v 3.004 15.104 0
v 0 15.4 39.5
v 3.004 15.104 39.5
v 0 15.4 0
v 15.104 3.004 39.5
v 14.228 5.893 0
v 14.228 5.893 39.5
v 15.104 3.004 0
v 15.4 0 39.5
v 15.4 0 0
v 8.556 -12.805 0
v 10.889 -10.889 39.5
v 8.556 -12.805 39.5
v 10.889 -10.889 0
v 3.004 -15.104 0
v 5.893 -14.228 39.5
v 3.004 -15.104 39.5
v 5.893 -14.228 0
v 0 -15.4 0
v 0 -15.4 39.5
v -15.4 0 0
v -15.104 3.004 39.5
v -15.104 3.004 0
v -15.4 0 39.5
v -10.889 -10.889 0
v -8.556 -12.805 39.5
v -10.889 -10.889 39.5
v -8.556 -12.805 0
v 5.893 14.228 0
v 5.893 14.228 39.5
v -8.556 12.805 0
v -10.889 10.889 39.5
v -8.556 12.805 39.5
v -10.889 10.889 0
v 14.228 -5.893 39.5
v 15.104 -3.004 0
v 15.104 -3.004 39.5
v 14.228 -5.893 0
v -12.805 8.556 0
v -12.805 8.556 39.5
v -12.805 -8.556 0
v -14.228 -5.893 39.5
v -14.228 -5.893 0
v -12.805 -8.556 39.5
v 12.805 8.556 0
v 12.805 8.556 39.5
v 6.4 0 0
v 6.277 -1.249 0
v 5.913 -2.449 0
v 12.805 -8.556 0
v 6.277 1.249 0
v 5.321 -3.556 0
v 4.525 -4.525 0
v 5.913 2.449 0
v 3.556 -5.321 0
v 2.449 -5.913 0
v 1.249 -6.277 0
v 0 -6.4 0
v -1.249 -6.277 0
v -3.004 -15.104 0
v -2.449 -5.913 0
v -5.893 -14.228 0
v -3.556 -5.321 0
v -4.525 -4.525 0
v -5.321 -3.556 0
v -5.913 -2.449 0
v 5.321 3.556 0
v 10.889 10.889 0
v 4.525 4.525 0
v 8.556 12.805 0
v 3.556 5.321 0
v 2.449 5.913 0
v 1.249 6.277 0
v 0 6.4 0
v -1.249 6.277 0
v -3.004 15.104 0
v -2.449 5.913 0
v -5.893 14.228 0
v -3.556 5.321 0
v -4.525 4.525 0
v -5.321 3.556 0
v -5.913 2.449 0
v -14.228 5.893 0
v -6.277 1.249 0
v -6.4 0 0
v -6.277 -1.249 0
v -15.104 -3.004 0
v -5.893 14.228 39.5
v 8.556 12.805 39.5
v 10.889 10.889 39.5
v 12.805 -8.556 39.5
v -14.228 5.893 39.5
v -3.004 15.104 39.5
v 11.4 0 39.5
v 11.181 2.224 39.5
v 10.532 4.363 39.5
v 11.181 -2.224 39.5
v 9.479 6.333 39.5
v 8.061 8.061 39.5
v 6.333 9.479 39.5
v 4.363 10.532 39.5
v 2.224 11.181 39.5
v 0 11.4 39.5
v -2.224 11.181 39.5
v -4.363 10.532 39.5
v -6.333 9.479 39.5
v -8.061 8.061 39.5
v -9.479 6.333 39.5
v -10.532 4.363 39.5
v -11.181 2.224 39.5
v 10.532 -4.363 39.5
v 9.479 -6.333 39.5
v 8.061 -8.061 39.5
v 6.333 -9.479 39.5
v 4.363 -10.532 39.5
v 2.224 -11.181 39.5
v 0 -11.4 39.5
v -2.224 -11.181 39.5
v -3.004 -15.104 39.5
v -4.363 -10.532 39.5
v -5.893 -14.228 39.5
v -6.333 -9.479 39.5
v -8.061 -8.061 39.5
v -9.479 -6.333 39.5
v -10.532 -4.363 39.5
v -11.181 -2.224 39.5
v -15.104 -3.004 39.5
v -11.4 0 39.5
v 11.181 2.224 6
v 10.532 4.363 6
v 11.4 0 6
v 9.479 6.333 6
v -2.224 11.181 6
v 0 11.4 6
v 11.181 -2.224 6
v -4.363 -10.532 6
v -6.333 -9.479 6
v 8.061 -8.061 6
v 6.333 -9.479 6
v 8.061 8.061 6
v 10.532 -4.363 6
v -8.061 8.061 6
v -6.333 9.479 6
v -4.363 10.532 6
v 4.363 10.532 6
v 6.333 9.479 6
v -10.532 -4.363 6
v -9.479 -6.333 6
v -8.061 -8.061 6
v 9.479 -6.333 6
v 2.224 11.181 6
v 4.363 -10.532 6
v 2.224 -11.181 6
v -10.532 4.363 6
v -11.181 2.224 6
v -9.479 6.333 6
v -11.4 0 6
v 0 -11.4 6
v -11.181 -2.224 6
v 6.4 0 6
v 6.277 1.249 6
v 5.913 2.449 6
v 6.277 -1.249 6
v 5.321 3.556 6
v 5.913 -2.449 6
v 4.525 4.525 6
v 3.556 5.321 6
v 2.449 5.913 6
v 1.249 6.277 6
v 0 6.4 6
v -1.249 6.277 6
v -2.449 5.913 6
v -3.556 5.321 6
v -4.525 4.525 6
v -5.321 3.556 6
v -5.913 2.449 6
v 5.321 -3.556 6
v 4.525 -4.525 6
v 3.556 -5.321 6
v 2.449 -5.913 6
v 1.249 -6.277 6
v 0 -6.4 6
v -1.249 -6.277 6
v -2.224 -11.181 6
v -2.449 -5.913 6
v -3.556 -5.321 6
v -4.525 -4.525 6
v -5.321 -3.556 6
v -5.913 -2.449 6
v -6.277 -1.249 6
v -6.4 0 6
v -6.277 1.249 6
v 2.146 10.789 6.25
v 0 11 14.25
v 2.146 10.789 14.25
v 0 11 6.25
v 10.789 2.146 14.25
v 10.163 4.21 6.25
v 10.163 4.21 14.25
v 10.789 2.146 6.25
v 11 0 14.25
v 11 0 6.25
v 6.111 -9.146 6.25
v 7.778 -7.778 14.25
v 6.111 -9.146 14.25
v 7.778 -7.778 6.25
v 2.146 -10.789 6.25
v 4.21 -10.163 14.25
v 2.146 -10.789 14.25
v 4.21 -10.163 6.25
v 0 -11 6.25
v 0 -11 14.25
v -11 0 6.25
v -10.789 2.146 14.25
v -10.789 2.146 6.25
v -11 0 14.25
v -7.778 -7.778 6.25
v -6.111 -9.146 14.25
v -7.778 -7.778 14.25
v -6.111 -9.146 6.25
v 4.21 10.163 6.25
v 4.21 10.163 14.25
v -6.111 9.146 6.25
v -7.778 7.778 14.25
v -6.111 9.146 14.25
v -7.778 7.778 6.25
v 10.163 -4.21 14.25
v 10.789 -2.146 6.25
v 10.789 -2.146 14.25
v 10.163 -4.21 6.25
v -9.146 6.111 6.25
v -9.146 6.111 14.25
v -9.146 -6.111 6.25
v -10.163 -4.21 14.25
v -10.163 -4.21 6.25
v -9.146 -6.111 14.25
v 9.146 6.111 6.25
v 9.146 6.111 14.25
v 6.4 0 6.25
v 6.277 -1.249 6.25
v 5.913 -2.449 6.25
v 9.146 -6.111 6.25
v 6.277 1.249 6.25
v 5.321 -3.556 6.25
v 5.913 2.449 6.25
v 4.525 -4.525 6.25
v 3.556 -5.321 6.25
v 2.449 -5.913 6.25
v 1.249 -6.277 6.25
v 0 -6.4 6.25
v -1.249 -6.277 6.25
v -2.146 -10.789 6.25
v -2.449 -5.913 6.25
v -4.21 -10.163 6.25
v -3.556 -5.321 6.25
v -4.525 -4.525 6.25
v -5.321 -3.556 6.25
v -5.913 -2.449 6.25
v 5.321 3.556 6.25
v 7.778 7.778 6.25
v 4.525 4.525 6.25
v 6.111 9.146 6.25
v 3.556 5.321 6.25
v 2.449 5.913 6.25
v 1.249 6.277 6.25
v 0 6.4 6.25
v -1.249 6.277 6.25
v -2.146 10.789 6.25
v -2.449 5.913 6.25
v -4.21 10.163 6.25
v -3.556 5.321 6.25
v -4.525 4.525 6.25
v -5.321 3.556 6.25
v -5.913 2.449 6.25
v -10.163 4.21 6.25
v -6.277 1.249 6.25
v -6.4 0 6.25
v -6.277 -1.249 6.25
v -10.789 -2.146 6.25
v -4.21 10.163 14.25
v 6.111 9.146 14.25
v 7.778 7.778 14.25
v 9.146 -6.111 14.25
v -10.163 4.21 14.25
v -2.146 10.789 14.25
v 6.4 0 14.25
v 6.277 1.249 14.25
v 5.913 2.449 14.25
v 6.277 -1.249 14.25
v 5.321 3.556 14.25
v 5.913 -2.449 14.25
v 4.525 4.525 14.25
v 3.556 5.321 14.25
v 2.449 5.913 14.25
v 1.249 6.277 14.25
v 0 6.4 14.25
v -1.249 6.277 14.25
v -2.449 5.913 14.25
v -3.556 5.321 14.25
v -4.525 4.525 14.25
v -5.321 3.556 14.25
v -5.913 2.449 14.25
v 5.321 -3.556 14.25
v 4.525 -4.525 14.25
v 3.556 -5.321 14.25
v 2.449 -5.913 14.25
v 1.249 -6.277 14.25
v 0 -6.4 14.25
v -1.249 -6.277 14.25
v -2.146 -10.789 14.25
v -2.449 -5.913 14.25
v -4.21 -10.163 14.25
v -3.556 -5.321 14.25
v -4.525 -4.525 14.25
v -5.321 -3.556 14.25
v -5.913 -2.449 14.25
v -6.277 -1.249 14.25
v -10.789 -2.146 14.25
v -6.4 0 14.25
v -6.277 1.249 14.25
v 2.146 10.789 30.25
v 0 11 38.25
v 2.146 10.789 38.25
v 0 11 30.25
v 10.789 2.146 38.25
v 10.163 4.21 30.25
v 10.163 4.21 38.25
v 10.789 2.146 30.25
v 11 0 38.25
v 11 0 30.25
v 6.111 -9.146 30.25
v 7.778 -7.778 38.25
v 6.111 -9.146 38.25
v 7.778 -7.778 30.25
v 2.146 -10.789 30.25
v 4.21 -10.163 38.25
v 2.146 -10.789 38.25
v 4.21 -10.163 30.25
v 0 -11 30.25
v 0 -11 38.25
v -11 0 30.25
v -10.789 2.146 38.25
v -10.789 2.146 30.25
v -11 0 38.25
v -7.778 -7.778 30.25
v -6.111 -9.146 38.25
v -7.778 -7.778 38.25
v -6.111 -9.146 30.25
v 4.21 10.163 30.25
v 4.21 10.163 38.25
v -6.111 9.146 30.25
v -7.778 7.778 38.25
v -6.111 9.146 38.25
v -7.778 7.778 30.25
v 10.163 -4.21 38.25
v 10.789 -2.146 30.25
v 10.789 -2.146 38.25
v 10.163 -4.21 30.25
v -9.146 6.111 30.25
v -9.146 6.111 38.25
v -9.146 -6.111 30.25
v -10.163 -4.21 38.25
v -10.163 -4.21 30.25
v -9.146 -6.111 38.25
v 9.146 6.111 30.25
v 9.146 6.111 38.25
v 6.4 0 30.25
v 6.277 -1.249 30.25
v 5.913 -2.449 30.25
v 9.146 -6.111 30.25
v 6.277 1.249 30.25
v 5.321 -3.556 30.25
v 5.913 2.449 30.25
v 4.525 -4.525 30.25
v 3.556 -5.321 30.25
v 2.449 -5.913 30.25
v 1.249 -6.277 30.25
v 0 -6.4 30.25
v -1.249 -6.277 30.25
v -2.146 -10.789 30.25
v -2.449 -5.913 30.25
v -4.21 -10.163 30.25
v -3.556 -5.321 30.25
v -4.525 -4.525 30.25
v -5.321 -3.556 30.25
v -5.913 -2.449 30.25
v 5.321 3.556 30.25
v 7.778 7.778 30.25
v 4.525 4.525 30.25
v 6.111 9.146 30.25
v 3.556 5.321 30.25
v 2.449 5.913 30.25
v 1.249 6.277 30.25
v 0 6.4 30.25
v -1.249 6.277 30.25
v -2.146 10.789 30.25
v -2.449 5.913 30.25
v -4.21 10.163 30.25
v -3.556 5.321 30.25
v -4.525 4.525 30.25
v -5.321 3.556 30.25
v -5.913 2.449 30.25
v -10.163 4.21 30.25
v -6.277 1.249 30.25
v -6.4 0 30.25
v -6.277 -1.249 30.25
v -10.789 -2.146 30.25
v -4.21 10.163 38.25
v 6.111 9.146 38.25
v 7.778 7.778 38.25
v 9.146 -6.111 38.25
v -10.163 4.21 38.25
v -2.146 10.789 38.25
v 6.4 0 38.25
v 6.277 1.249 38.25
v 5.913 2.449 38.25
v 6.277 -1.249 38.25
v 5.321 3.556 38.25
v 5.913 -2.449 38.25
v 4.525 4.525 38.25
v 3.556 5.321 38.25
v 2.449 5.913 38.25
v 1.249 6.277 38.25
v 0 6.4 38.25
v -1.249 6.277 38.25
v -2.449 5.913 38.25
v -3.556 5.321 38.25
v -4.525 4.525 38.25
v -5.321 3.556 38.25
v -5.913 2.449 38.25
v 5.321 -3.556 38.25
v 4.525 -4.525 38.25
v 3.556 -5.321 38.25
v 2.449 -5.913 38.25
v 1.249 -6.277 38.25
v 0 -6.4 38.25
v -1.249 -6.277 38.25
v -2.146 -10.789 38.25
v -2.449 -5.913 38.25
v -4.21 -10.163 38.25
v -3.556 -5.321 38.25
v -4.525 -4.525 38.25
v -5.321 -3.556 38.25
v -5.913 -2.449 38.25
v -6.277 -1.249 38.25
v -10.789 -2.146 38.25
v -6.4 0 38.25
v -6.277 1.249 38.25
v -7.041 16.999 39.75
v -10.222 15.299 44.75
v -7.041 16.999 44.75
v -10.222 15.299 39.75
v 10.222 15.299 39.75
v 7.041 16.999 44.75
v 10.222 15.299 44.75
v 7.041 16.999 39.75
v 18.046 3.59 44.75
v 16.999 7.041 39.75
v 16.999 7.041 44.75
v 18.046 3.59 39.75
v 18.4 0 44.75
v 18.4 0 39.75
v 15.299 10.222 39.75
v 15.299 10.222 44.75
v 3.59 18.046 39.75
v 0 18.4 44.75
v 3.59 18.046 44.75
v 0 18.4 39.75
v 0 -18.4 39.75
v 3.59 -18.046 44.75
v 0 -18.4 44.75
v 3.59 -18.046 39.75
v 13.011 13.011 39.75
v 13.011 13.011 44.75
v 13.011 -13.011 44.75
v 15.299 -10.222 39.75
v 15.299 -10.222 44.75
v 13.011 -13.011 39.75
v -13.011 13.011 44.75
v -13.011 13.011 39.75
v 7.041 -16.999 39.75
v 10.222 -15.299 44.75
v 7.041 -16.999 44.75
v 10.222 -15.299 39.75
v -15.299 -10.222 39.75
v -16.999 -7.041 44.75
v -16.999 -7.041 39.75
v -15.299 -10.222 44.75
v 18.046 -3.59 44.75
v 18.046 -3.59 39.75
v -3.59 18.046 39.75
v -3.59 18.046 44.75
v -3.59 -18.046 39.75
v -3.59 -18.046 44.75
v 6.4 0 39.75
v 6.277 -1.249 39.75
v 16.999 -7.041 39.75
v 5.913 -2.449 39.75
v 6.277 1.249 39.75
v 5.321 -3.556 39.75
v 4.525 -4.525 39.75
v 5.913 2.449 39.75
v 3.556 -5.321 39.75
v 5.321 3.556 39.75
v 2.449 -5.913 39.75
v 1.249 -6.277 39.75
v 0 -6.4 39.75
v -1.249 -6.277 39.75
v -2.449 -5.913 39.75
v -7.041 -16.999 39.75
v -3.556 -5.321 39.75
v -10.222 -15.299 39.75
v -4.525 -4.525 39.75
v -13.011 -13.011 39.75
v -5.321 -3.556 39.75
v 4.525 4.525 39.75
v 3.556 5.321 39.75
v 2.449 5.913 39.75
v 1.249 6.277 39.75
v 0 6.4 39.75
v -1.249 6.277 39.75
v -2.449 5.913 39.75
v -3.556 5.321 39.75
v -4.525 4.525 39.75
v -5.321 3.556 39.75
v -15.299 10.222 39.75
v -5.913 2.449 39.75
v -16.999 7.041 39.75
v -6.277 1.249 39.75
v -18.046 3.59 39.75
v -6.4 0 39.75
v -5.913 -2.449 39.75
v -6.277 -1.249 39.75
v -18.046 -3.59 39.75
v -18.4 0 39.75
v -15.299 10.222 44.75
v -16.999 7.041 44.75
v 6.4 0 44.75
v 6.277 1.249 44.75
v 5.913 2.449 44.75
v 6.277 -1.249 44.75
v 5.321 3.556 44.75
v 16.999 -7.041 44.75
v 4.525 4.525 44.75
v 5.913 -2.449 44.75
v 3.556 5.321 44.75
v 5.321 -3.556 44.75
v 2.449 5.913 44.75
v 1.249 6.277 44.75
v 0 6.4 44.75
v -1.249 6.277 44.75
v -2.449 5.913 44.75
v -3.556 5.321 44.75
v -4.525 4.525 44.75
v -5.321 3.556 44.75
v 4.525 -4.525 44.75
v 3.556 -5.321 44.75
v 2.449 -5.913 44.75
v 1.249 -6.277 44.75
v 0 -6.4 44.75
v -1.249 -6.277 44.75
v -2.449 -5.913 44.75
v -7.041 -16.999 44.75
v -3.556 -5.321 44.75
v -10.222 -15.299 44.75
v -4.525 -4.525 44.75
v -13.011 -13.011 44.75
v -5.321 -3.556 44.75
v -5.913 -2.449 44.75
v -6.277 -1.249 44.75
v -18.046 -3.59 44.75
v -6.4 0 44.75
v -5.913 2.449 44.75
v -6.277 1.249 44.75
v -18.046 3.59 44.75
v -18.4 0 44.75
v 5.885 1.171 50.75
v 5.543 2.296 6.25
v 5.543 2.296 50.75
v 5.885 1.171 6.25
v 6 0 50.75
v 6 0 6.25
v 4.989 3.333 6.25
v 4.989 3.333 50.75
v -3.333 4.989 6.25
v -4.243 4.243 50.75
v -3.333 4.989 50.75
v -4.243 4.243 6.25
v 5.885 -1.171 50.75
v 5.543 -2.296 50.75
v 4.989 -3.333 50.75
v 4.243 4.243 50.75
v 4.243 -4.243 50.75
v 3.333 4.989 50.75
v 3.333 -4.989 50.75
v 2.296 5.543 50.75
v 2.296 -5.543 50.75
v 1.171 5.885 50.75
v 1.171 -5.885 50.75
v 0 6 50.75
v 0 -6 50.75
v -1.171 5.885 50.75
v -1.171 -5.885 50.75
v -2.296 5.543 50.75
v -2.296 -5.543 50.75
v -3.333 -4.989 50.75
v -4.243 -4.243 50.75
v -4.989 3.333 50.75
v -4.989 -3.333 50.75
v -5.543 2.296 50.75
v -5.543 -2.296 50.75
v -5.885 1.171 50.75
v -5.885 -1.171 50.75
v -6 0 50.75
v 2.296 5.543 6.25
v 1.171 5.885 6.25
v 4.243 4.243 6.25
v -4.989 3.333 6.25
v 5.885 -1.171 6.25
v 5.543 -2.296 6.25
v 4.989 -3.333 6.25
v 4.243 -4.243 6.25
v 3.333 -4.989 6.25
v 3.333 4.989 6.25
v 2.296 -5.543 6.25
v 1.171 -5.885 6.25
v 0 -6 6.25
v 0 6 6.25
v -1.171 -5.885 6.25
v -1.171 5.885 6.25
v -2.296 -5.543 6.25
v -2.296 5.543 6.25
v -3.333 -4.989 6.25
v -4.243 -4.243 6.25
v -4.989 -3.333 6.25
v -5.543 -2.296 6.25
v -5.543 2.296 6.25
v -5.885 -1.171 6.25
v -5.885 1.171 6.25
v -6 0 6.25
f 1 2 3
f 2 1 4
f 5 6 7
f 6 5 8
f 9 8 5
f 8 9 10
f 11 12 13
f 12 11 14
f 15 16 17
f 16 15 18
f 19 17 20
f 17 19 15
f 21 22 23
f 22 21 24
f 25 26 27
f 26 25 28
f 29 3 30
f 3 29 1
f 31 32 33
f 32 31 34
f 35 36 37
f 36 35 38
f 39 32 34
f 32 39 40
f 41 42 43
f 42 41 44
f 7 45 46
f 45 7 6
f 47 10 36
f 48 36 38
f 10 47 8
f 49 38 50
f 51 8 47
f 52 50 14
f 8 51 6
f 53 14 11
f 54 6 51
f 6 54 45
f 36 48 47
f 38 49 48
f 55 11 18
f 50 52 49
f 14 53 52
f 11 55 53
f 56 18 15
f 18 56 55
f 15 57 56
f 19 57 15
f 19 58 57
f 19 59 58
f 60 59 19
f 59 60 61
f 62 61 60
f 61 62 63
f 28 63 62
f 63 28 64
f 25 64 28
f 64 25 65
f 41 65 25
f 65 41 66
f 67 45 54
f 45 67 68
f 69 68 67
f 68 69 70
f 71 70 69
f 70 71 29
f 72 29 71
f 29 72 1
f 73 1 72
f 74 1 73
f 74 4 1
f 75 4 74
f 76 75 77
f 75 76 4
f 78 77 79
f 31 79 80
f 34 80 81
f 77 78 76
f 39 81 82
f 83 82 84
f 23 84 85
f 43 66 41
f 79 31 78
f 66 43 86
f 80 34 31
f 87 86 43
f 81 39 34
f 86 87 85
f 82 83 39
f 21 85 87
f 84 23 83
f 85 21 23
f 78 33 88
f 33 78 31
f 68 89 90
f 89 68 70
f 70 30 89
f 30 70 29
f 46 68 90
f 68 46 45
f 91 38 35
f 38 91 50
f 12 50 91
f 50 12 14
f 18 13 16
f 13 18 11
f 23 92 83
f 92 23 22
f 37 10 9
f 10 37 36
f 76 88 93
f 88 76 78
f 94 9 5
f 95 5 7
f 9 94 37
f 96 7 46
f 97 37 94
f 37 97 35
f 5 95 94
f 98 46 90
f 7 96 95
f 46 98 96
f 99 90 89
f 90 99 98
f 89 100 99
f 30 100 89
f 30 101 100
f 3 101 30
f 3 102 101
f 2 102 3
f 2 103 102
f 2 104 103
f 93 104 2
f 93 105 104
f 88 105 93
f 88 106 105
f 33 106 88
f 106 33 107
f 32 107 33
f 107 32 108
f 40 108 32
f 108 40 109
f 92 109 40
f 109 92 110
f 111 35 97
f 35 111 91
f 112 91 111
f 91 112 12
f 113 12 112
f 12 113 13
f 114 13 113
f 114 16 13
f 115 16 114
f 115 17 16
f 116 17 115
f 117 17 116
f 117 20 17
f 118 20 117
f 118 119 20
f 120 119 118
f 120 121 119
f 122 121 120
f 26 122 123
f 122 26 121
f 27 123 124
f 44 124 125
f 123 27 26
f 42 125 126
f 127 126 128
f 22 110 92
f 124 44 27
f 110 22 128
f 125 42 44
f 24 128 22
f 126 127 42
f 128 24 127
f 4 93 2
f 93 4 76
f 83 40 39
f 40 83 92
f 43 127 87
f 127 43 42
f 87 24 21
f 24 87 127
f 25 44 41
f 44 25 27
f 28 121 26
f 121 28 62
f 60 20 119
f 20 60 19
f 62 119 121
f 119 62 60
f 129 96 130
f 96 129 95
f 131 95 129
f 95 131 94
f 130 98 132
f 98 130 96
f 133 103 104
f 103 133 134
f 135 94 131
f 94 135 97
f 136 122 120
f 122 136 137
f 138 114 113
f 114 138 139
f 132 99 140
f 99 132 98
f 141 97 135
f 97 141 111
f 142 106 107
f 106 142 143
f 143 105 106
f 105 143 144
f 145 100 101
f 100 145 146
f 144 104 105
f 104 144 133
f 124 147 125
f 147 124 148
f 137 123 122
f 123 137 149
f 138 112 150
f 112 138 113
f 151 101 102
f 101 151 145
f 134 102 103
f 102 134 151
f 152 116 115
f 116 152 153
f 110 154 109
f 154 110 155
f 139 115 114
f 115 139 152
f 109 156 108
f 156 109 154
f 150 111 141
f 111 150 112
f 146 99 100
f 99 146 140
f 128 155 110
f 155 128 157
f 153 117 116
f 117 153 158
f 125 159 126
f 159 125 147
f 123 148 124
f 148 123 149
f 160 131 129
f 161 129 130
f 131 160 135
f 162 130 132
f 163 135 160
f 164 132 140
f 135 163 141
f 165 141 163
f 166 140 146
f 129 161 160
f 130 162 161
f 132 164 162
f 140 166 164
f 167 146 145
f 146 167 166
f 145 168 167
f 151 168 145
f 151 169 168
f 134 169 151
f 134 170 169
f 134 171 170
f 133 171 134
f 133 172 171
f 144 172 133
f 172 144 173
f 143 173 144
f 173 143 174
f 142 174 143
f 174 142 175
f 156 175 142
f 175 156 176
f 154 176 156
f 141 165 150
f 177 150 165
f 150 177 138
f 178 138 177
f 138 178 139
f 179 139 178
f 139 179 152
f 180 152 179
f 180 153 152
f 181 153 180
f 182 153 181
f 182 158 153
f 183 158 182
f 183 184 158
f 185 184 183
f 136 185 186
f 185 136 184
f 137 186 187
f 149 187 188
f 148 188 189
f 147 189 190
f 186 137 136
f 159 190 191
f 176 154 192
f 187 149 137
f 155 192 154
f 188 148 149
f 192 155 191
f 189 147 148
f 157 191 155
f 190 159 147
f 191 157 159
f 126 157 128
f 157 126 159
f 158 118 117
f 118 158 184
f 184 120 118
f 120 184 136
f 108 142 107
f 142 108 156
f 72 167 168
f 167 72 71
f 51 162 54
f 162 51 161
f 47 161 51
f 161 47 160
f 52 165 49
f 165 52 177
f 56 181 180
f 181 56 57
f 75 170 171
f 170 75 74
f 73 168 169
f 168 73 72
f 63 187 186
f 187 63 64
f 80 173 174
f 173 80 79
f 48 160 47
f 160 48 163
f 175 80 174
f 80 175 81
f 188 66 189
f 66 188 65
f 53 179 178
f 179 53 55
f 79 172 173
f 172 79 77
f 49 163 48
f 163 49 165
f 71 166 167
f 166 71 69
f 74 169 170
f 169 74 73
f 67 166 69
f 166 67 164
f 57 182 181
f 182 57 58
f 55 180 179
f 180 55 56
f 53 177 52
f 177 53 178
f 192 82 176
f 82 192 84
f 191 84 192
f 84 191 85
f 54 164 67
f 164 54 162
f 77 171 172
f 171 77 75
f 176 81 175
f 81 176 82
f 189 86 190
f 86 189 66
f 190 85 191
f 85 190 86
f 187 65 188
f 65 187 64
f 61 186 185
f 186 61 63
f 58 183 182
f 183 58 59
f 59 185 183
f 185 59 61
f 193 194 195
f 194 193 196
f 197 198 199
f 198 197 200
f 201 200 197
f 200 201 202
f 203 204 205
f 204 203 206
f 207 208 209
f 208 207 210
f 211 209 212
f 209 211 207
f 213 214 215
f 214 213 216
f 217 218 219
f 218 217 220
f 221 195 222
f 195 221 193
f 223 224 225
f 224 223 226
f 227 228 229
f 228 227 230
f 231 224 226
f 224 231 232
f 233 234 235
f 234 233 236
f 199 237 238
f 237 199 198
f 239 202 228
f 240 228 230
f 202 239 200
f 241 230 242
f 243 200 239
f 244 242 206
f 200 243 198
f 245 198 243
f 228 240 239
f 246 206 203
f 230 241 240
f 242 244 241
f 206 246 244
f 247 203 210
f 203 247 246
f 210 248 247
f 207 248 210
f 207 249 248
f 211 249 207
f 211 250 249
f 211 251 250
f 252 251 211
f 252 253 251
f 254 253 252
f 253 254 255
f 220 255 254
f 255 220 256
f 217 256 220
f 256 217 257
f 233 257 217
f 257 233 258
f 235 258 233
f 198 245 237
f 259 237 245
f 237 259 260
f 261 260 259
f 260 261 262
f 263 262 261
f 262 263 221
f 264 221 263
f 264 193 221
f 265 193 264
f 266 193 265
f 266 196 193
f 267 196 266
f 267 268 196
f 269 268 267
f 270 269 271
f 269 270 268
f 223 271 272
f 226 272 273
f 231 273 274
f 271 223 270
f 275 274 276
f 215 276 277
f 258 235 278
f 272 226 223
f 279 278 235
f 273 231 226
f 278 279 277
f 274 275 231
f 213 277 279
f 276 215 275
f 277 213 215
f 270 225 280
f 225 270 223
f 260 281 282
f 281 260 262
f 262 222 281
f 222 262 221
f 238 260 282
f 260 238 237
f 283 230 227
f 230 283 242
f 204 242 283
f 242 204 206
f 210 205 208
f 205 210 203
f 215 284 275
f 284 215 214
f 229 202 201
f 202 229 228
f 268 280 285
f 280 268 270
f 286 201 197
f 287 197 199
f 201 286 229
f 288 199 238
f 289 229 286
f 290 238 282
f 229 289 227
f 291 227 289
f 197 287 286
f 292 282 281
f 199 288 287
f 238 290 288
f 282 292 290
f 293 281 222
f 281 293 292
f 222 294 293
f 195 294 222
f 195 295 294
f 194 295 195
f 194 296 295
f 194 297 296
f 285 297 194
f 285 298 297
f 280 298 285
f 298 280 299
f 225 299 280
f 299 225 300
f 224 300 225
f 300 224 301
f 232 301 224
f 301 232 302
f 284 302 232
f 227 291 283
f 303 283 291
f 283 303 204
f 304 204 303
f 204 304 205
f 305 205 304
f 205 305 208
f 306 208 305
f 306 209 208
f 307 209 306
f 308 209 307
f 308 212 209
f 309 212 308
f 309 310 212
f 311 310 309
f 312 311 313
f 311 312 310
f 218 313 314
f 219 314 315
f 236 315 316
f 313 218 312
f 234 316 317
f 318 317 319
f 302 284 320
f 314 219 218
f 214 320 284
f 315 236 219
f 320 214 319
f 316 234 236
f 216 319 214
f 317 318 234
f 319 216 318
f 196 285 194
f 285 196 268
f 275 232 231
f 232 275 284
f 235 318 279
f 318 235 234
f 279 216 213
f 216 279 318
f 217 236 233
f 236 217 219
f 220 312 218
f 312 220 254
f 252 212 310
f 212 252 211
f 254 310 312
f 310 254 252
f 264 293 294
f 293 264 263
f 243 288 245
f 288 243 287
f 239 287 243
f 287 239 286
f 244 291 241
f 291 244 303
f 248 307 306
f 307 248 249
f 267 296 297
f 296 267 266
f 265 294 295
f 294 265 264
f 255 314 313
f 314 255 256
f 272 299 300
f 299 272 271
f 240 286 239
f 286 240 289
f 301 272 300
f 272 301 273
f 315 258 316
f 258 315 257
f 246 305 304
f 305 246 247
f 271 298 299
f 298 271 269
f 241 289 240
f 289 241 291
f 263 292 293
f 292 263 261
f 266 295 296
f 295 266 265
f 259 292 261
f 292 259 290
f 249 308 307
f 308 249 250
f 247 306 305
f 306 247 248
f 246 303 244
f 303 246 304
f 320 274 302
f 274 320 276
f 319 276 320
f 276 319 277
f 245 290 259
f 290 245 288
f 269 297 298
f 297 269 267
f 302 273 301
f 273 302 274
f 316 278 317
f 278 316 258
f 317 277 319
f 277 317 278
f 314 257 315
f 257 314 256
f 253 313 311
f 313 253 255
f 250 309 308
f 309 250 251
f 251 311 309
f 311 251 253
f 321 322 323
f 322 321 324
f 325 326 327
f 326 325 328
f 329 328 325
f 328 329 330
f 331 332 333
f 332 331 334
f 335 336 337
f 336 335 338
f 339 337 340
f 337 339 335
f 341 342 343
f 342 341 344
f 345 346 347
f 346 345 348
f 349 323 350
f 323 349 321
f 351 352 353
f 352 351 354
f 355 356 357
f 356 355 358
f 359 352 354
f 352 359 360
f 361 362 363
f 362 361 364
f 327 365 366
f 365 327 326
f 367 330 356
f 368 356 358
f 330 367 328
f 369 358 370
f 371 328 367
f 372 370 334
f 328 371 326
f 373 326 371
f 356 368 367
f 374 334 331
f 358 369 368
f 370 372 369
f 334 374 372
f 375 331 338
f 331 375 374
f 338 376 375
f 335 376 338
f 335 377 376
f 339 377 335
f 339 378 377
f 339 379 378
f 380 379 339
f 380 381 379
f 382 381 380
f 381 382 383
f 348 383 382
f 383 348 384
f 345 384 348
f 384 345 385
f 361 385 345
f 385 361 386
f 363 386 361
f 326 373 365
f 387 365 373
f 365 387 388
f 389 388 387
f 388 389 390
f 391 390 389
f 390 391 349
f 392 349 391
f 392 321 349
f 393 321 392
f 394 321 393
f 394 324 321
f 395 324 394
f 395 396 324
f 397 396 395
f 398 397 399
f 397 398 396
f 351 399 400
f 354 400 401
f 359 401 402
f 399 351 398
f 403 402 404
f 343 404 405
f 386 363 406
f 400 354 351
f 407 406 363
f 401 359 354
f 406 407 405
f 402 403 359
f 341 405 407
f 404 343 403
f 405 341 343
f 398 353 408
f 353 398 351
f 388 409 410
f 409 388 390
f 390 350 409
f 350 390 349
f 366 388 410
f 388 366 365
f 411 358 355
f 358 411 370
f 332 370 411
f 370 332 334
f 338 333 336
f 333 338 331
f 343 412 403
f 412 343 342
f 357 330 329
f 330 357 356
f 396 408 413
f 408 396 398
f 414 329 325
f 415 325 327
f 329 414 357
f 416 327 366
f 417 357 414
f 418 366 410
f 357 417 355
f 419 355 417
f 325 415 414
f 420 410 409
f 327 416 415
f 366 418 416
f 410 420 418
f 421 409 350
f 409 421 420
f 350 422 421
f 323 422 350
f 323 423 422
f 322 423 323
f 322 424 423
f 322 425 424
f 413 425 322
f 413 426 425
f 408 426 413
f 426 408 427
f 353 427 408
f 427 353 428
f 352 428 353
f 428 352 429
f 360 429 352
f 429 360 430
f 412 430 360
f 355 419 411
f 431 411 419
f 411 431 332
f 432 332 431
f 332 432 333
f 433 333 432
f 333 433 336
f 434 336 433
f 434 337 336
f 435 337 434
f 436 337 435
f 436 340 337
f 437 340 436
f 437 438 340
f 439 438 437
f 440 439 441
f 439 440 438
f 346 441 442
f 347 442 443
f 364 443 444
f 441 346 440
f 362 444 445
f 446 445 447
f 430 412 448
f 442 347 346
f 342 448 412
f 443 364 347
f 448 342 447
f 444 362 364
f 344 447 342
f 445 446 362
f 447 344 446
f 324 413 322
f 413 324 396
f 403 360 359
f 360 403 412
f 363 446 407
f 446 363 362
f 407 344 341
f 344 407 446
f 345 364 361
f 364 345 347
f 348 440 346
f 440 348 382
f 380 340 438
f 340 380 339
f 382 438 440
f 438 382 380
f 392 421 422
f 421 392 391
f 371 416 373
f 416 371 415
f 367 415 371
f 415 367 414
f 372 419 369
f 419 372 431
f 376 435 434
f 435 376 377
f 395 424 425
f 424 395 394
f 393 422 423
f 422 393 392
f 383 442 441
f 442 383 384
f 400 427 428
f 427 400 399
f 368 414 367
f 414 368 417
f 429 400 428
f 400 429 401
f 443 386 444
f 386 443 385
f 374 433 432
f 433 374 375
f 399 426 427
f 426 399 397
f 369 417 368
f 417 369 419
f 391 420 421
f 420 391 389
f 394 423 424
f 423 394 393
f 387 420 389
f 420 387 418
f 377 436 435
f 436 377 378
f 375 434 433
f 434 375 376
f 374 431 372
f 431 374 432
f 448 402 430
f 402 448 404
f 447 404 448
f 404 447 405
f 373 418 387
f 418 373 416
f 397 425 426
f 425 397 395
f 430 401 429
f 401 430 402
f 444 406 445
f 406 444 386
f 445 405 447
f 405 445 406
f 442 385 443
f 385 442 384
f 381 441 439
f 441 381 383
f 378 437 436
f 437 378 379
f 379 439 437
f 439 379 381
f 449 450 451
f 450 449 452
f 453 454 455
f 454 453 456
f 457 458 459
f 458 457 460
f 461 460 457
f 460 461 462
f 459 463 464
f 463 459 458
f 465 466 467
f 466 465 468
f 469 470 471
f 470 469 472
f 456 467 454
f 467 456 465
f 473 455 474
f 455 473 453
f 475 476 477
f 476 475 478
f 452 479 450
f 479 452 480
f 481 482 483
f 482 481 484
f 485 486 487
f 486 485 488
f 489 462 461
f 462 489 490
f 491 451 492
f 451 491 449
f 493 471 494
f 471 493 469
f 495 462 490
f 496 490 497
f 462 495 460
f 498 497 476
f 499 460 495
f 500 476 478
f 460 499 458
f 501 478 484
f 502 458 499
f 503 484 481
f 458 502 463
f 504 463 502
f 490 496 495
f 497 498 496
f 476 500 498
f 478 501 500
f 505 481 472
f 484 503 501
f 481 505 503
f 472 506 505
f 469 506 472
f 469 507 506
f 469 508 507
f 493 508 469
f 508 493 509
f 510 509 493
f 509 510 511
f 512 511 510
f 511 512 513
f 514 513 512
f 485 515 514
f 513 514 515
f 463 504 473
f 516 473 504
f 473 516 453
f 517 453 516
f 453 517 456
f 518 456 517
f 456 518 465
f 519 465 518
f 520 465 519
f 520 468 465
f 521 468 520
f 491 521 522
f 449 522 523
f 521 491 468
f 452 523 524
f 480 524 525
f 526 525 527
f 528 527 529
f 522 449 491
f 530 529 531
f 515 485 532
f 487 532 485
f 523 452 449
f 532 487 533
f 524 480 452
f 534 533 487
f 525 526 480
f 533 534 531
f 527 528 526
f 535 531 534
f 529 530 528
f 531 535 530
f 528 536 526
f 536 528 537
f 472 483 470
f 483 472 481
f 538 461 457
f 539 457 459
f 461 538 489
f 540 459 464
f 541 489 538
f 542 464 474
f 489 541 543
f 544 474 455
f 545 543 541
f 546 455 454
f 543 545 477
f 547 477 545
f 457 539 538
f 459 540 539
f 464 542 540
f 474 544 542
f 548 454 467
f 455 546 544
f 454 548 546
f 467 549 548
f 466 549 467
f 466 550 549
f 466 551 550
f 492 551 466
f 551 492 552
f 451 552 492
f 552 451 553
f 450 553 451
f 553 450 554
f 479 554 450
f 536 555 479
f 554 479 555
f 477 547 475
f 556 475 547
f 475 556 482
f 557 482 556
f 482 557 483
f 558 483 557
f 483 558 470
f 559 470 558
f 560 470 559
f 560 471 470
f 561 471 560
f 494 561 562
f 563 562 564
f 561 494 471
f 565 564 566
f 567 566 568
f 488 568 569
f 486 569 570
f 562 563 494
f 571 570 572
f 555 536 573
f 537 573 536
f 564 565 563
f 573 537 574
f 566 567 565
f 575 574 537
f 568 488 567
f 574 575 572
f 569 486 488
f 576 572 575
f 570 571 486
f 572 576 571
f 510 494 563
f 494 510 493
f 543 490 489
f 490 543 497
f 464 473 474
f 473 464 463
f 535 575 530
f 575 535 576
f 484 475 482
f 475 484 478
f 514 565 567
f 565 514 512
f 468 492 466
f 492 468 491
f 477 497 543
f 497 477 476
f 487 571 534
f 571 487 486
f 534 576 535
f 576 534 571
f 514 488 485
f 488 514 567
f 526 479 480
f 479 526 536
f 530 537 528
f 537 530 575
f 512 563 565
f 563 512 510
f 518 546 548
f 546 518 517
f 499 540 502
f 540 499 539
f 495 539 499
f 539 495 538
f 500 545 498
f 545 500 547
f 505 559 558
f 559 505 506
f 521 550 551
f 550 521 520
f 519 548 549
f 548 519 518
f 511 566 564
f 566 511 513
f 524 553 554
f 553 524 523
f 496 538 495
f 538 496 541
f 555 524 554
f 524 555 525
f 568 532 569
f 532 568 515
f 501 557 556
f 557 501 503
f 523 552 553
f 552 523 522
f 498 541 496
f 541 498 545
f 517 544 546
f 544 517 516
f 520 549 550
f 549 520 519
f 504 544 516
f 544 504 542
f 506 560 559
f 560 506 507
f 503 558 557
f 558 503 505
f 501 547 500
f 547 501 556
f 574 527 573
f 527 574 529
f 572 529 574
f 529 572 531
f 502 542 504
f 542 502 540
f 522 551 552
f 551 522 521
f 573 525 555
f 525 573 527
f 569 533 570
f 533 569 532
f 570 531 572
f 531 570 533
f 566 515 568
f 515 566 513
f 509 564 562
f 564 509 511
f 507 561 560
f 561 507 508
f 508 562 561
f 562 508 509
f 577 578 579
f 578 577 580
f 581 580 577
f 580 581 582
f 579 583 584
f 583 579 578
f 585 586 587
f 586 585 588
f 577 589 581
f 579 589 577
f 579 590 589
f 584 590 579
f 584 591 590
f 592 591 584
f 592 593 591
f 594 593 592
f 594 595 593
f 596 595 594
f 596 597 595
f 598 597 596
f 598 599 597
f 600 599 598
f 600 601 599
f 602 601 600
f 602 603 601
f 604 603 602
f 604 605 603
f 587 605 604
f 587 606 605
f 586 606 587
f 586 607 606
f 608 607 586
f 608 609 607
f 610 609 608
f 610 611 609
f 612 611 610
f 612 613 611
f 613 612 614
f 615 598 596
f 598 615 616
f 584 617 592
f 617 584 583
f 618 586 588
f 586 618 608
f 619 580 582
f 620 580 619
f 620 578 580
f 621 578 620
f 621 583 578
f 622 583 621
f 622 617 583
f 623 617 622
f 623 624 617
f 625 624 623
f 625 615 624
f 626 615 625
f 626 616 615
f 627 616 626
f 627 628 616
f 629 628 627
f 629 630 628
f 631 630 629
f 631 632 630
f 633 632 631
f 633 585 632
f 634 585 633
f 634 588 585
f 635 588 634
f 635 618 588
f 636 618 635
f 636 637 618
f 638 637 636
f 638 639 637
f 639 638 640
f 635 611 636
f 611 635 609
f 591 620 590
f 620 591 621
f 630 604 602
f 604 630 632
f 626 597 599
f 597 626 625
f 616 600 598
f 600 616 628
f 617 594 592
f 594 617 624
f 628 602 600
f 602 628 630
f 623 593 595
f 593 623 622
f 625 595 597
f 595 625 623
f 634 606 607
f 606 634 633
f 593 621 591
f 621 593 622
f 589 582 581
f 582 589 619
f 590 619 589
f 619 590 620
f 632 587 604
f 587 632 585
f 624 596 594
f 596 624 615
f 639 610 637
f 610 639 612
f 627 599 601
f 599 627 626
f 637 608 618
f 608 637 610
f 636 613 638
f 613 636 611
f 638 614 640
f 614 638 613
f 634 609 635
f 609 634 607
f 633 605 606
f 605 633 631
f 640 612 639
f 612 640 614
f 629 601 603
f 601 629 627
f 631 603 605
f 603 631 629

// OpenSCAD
$fn = 32;

// ------------------------------------------------------------------------
// Shaft station: cup d30.8 x 39.5 mm, shaft d12
// Every part is its own module, assembly() places every instance.
// ------------------------------------------------------------------------

// --- part 1 ---
module housing_cup() {
  difference() {
    cylinder(h = 39.5, d = 30.8);
    translate([0, 0, 6]) cylinder(h = 34.5, d = 22.8);
    translate([0, 0, -1]) cylinder(h = 8, d = 12.8);
  }
}

// --- part 2 ---
module bearing_lower() {
  difference() {
      translate([0, 0, 0]) cylinder(h = 8, d = 22);
      translate([0, 0, -1]) cylinder(h = 10, d = 12.8);
    }
}

// --- part 3 ---
module bearing_upper() {
  difference() {
      translate([0, 0, 0]) cylinder(h = 8, d = 22);
      translate([0, 0, -1]) cylinder(h = 10, d = 12.8);
    }
}

// --- part 4 ---
module station_shaft() {
  translate([0, 0, -22.25]) cylinder(h = 44.5, d = 12);
}

// --- part 5 ---
module station_cover() {
  difference() {
    cylinder(h = 5, d = 36.8);
    translate([0, 0, -1]) cylinder(h = 7, d = 12.8);
  }
}

// --- assembly ---
module assembly() {
  color([0.80, 0.24, 0.20]) translate([0, 0, 0]) rotate([0, 0, 0]) housing_cup();
  color([0.20, 0.45, 0.75]) translate([0, 0, 6.25]) rotate([0, 0, 0]) bearing_lower();
  color([0.25, 0.62, 0.32]) translate([0, 0, 30.25]) rotate([0, 0, 0]) bearing_upper();
  color([0.92, 0.70, 0.18]) translate([0, 0, 28.5]) rotate([0, 0, 0]) station_shaft();
  color([0.58, 0.35, 0.70]) translate([0, 0, 39.75]) rotate([0, 0, 0]) station_cover();
}

assembly();
